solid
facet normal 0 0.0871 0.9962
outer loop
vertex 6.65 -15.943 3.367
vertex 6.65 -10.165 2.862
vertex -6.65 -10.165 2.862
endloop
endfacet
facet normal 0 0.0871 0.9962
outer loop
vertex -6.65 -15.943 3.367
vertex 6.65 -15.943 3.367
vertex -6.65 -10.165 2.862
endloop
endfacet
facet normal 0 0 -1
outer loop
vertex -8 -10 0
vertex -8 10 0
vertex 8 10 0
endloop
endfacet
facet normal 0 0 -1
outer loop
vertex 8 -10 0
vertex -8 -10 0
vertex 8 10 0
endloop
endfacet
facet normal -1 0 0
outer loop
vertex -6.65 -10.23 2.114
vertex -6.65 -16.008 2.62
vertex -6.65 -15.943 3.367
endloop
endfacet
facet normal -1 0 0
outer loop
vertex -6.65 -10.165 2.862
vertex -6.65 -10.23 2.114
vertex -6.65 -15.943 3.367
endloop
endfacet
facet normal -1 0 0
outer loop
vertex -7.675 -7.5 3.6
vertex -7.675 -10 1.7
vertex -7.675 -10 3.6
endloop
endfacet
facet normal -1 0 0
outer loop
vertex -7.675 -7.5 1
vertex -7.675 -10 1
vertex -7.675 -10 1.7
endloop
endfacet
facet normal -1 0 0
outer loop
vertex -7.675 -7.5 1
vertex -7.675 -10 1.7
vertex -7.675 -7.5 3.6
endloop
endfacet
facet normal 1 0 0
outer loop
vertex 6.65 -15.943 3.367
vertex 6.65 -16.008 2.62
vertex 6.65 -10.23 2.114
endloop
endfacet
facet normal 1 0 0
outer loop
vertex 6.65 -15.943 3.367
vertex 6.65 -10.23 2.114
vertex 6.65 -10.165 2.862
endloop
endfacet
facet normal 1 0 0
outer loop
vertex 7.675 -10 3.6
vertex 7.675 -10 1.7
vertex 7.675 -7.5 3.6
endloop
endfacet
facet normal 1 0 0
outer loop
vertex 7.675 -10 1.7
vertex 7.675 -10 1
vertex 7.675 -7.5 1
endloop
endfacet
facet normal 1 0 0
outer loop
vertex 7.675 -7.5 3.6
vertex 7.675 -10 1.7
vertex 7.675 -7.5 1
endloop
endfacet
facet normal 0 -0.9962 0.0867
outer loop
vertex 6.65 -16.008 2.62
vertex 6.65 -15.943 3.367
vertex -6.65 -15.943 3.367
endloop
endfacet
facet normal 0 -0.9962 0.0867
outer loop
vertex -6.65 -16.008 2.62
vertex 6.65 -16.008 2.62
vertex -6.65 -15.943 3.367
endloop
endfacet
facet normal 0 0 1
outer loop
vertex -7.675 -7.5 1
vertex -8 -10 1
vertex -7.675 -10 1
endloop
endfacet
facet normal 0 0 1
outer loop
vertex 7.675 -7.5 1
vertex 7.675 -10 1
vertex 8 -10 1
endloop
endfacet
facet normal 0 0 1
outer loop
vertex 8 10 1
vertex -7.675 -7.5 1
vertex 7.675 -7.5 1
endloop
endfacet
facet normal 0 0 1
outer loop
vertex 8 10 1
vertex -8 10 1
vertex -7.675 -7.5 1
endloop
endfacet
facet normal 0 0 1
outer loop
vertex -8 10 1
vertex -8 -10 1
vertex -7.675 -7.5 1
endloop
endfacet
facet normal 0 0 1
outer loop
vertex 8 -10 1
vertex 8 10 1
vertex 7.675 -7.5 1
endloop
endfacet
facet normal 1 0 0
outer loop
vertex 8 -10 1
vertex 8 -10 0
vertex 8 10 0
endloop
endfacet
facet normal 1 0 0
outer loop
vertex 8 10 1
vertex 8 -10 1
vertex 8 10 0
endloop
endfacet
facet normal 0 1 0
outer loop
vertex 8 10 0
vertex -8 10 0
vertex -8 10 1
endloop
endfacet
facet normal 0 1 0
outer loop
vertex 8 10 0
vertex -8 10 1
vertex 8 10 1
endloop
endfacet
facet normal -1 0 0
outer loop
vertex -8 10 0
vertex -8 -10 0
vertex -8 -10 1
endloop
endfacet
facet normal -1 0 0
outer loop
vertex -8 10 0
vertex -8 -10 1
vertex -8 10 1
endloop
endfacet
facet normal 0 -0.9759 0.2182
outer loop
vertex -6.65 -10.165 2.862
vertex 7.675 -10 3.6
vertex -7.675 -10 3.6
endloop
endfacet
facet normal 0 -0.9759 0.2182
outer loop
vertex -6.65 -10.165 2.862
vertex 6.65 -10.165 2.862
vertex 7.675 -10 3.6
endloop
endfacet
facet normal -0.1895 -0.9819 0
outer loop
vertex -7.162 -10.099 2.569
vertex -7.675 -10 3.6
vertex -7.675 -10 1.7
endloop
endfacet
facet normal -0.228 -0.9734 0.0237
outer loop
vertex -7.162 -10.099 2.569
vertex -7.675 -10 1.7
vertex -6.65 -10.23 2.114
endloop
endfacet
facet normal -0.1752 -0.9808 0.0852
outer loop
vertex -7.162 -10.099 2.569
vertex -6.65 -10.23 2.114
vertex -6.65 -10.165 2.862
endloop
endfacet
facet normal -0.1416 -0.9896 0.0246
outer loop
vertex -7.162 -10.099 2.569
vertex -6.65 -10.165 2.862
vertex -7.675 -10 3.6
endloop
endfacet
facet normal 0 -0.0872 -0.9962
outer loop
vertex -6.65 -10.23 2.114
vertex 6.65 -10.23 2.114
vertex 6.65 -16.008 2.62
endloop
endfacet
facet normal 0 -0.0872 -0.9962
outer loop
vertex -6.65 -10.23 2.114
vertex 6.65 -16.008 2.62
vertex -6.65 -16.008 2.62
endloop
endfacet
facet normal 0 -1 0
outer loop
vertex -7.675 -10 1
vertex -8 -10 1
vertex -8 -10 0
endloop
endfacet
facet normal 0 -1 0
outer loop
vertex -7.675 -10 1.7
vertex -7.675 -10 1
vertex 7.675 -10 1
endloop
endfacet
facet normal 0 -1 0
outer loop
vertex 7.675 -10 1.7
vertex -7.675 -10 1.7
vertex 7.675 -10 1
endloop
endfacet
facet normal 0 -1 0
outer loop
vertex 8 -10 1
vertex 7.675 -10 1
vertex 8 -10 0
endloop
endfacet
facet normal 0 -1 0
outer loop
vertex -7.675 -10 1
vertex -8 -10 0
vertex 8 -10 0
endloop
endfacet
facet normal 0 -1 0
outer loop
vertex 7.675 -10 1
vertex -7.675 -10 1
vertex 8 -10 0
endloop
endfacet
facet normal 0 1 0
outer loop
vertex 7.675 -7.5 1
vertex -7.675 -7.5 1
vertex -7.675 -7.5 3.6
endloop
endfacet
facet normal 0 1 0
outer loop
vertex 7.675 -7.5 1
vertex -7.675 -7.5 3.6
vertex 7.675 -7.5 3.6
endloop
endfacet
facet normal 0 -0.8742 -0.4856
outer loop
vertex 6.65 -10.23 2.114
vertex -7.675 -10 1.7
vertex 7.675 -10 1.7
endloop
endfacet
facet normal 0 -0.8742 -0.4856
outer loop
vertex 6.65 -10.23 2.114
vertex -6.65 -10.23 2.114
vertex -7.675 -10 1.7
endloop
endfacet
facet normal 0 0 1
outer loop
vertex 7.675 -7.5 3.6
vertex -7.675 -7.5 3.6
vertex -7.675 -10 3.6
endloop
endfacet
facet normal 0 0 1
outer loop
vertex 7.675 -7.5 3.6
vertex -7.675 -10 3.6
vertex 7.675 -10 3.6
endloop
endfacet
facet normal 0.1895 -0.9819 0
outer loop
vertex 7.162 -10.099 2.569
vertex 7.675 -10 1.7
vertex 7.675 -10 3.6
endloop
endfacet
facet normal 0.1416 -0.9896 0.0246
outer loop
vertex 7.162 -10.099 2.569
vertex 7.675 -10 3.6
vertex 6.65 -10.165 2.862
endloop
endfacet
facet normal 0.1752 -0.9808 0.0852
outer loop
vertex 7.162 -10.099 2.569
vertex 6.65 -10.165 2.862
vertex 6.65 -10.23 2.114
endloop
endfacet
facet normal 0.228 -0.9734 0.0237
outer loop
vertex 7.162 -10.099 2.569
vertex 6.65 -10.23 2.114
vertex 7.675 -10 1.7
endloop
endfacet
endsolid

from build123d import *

# Parameters (mm, degrees)
F0_W      = 16
F0_H      = 20
F1_DEPTH  = 1
F2_W      = 15.35
F2_H      = 2.5
F3_DEPTH  = 2.6
F7_W      = 13.3
F7_H      = 0.75
F8_DEPTH  = 5.8
F4_W      = 15.35
F4_H      = 1.9
F8_FACE_W = 13.3
F8_FACE_H = 0.75


with BuildPart() as f1:
    # F0 (on Top) → F1 (new body)
    with BuildSketch(Plane.XY):
        Rectangle(F0_W, F0_H)
    extrude(amount=F1_DEPTH)

    # F2 (on face) → F3 (join)
    with BuildSketch(Plane.XY.offset(1)):
        with Locations((0, -8.75)):
            Rectangle(F2_W, F2_H)
    extrude(amount=F3_DEPTH)



with BuildPart() as f8:
    # F7 (on face) → F8 (new body)
    with BuildSketch(Plane(origin=(0, -10.3362249547, 0.9043025072), x_dir=(-1, 0, 0), z_dir=(0, 0.9961946981, -0.0871557427))):
        with Locations((0, 1.5897434857)):
            Rectangle(F7_W, F7_H)
    extrude(amount=-F8_DEPTH)


with BuildPart() as f1_1:
    add(f1.part)

    add(f8.part)  # F9 merges F8
    # F4 (on face) → F9 section 0
    with BuildSketch(Plane.XZ.offset(10)):
        with Locations((0, 2.65)):
            Rectangle(F4_W, F4_H)
    # F8_face (on face) → F9 section 1
    with BuildSketch(Plane(origin=(0, -10.1976696804, 2.4879965389), x_dir=(-1, 0, 0), z_dir=(0, 0.9961946981, -0.0871557427))):
        Rectangle(F8_FACE_W, F8_FACE_H)
    loft()


solid = f1_1.part
